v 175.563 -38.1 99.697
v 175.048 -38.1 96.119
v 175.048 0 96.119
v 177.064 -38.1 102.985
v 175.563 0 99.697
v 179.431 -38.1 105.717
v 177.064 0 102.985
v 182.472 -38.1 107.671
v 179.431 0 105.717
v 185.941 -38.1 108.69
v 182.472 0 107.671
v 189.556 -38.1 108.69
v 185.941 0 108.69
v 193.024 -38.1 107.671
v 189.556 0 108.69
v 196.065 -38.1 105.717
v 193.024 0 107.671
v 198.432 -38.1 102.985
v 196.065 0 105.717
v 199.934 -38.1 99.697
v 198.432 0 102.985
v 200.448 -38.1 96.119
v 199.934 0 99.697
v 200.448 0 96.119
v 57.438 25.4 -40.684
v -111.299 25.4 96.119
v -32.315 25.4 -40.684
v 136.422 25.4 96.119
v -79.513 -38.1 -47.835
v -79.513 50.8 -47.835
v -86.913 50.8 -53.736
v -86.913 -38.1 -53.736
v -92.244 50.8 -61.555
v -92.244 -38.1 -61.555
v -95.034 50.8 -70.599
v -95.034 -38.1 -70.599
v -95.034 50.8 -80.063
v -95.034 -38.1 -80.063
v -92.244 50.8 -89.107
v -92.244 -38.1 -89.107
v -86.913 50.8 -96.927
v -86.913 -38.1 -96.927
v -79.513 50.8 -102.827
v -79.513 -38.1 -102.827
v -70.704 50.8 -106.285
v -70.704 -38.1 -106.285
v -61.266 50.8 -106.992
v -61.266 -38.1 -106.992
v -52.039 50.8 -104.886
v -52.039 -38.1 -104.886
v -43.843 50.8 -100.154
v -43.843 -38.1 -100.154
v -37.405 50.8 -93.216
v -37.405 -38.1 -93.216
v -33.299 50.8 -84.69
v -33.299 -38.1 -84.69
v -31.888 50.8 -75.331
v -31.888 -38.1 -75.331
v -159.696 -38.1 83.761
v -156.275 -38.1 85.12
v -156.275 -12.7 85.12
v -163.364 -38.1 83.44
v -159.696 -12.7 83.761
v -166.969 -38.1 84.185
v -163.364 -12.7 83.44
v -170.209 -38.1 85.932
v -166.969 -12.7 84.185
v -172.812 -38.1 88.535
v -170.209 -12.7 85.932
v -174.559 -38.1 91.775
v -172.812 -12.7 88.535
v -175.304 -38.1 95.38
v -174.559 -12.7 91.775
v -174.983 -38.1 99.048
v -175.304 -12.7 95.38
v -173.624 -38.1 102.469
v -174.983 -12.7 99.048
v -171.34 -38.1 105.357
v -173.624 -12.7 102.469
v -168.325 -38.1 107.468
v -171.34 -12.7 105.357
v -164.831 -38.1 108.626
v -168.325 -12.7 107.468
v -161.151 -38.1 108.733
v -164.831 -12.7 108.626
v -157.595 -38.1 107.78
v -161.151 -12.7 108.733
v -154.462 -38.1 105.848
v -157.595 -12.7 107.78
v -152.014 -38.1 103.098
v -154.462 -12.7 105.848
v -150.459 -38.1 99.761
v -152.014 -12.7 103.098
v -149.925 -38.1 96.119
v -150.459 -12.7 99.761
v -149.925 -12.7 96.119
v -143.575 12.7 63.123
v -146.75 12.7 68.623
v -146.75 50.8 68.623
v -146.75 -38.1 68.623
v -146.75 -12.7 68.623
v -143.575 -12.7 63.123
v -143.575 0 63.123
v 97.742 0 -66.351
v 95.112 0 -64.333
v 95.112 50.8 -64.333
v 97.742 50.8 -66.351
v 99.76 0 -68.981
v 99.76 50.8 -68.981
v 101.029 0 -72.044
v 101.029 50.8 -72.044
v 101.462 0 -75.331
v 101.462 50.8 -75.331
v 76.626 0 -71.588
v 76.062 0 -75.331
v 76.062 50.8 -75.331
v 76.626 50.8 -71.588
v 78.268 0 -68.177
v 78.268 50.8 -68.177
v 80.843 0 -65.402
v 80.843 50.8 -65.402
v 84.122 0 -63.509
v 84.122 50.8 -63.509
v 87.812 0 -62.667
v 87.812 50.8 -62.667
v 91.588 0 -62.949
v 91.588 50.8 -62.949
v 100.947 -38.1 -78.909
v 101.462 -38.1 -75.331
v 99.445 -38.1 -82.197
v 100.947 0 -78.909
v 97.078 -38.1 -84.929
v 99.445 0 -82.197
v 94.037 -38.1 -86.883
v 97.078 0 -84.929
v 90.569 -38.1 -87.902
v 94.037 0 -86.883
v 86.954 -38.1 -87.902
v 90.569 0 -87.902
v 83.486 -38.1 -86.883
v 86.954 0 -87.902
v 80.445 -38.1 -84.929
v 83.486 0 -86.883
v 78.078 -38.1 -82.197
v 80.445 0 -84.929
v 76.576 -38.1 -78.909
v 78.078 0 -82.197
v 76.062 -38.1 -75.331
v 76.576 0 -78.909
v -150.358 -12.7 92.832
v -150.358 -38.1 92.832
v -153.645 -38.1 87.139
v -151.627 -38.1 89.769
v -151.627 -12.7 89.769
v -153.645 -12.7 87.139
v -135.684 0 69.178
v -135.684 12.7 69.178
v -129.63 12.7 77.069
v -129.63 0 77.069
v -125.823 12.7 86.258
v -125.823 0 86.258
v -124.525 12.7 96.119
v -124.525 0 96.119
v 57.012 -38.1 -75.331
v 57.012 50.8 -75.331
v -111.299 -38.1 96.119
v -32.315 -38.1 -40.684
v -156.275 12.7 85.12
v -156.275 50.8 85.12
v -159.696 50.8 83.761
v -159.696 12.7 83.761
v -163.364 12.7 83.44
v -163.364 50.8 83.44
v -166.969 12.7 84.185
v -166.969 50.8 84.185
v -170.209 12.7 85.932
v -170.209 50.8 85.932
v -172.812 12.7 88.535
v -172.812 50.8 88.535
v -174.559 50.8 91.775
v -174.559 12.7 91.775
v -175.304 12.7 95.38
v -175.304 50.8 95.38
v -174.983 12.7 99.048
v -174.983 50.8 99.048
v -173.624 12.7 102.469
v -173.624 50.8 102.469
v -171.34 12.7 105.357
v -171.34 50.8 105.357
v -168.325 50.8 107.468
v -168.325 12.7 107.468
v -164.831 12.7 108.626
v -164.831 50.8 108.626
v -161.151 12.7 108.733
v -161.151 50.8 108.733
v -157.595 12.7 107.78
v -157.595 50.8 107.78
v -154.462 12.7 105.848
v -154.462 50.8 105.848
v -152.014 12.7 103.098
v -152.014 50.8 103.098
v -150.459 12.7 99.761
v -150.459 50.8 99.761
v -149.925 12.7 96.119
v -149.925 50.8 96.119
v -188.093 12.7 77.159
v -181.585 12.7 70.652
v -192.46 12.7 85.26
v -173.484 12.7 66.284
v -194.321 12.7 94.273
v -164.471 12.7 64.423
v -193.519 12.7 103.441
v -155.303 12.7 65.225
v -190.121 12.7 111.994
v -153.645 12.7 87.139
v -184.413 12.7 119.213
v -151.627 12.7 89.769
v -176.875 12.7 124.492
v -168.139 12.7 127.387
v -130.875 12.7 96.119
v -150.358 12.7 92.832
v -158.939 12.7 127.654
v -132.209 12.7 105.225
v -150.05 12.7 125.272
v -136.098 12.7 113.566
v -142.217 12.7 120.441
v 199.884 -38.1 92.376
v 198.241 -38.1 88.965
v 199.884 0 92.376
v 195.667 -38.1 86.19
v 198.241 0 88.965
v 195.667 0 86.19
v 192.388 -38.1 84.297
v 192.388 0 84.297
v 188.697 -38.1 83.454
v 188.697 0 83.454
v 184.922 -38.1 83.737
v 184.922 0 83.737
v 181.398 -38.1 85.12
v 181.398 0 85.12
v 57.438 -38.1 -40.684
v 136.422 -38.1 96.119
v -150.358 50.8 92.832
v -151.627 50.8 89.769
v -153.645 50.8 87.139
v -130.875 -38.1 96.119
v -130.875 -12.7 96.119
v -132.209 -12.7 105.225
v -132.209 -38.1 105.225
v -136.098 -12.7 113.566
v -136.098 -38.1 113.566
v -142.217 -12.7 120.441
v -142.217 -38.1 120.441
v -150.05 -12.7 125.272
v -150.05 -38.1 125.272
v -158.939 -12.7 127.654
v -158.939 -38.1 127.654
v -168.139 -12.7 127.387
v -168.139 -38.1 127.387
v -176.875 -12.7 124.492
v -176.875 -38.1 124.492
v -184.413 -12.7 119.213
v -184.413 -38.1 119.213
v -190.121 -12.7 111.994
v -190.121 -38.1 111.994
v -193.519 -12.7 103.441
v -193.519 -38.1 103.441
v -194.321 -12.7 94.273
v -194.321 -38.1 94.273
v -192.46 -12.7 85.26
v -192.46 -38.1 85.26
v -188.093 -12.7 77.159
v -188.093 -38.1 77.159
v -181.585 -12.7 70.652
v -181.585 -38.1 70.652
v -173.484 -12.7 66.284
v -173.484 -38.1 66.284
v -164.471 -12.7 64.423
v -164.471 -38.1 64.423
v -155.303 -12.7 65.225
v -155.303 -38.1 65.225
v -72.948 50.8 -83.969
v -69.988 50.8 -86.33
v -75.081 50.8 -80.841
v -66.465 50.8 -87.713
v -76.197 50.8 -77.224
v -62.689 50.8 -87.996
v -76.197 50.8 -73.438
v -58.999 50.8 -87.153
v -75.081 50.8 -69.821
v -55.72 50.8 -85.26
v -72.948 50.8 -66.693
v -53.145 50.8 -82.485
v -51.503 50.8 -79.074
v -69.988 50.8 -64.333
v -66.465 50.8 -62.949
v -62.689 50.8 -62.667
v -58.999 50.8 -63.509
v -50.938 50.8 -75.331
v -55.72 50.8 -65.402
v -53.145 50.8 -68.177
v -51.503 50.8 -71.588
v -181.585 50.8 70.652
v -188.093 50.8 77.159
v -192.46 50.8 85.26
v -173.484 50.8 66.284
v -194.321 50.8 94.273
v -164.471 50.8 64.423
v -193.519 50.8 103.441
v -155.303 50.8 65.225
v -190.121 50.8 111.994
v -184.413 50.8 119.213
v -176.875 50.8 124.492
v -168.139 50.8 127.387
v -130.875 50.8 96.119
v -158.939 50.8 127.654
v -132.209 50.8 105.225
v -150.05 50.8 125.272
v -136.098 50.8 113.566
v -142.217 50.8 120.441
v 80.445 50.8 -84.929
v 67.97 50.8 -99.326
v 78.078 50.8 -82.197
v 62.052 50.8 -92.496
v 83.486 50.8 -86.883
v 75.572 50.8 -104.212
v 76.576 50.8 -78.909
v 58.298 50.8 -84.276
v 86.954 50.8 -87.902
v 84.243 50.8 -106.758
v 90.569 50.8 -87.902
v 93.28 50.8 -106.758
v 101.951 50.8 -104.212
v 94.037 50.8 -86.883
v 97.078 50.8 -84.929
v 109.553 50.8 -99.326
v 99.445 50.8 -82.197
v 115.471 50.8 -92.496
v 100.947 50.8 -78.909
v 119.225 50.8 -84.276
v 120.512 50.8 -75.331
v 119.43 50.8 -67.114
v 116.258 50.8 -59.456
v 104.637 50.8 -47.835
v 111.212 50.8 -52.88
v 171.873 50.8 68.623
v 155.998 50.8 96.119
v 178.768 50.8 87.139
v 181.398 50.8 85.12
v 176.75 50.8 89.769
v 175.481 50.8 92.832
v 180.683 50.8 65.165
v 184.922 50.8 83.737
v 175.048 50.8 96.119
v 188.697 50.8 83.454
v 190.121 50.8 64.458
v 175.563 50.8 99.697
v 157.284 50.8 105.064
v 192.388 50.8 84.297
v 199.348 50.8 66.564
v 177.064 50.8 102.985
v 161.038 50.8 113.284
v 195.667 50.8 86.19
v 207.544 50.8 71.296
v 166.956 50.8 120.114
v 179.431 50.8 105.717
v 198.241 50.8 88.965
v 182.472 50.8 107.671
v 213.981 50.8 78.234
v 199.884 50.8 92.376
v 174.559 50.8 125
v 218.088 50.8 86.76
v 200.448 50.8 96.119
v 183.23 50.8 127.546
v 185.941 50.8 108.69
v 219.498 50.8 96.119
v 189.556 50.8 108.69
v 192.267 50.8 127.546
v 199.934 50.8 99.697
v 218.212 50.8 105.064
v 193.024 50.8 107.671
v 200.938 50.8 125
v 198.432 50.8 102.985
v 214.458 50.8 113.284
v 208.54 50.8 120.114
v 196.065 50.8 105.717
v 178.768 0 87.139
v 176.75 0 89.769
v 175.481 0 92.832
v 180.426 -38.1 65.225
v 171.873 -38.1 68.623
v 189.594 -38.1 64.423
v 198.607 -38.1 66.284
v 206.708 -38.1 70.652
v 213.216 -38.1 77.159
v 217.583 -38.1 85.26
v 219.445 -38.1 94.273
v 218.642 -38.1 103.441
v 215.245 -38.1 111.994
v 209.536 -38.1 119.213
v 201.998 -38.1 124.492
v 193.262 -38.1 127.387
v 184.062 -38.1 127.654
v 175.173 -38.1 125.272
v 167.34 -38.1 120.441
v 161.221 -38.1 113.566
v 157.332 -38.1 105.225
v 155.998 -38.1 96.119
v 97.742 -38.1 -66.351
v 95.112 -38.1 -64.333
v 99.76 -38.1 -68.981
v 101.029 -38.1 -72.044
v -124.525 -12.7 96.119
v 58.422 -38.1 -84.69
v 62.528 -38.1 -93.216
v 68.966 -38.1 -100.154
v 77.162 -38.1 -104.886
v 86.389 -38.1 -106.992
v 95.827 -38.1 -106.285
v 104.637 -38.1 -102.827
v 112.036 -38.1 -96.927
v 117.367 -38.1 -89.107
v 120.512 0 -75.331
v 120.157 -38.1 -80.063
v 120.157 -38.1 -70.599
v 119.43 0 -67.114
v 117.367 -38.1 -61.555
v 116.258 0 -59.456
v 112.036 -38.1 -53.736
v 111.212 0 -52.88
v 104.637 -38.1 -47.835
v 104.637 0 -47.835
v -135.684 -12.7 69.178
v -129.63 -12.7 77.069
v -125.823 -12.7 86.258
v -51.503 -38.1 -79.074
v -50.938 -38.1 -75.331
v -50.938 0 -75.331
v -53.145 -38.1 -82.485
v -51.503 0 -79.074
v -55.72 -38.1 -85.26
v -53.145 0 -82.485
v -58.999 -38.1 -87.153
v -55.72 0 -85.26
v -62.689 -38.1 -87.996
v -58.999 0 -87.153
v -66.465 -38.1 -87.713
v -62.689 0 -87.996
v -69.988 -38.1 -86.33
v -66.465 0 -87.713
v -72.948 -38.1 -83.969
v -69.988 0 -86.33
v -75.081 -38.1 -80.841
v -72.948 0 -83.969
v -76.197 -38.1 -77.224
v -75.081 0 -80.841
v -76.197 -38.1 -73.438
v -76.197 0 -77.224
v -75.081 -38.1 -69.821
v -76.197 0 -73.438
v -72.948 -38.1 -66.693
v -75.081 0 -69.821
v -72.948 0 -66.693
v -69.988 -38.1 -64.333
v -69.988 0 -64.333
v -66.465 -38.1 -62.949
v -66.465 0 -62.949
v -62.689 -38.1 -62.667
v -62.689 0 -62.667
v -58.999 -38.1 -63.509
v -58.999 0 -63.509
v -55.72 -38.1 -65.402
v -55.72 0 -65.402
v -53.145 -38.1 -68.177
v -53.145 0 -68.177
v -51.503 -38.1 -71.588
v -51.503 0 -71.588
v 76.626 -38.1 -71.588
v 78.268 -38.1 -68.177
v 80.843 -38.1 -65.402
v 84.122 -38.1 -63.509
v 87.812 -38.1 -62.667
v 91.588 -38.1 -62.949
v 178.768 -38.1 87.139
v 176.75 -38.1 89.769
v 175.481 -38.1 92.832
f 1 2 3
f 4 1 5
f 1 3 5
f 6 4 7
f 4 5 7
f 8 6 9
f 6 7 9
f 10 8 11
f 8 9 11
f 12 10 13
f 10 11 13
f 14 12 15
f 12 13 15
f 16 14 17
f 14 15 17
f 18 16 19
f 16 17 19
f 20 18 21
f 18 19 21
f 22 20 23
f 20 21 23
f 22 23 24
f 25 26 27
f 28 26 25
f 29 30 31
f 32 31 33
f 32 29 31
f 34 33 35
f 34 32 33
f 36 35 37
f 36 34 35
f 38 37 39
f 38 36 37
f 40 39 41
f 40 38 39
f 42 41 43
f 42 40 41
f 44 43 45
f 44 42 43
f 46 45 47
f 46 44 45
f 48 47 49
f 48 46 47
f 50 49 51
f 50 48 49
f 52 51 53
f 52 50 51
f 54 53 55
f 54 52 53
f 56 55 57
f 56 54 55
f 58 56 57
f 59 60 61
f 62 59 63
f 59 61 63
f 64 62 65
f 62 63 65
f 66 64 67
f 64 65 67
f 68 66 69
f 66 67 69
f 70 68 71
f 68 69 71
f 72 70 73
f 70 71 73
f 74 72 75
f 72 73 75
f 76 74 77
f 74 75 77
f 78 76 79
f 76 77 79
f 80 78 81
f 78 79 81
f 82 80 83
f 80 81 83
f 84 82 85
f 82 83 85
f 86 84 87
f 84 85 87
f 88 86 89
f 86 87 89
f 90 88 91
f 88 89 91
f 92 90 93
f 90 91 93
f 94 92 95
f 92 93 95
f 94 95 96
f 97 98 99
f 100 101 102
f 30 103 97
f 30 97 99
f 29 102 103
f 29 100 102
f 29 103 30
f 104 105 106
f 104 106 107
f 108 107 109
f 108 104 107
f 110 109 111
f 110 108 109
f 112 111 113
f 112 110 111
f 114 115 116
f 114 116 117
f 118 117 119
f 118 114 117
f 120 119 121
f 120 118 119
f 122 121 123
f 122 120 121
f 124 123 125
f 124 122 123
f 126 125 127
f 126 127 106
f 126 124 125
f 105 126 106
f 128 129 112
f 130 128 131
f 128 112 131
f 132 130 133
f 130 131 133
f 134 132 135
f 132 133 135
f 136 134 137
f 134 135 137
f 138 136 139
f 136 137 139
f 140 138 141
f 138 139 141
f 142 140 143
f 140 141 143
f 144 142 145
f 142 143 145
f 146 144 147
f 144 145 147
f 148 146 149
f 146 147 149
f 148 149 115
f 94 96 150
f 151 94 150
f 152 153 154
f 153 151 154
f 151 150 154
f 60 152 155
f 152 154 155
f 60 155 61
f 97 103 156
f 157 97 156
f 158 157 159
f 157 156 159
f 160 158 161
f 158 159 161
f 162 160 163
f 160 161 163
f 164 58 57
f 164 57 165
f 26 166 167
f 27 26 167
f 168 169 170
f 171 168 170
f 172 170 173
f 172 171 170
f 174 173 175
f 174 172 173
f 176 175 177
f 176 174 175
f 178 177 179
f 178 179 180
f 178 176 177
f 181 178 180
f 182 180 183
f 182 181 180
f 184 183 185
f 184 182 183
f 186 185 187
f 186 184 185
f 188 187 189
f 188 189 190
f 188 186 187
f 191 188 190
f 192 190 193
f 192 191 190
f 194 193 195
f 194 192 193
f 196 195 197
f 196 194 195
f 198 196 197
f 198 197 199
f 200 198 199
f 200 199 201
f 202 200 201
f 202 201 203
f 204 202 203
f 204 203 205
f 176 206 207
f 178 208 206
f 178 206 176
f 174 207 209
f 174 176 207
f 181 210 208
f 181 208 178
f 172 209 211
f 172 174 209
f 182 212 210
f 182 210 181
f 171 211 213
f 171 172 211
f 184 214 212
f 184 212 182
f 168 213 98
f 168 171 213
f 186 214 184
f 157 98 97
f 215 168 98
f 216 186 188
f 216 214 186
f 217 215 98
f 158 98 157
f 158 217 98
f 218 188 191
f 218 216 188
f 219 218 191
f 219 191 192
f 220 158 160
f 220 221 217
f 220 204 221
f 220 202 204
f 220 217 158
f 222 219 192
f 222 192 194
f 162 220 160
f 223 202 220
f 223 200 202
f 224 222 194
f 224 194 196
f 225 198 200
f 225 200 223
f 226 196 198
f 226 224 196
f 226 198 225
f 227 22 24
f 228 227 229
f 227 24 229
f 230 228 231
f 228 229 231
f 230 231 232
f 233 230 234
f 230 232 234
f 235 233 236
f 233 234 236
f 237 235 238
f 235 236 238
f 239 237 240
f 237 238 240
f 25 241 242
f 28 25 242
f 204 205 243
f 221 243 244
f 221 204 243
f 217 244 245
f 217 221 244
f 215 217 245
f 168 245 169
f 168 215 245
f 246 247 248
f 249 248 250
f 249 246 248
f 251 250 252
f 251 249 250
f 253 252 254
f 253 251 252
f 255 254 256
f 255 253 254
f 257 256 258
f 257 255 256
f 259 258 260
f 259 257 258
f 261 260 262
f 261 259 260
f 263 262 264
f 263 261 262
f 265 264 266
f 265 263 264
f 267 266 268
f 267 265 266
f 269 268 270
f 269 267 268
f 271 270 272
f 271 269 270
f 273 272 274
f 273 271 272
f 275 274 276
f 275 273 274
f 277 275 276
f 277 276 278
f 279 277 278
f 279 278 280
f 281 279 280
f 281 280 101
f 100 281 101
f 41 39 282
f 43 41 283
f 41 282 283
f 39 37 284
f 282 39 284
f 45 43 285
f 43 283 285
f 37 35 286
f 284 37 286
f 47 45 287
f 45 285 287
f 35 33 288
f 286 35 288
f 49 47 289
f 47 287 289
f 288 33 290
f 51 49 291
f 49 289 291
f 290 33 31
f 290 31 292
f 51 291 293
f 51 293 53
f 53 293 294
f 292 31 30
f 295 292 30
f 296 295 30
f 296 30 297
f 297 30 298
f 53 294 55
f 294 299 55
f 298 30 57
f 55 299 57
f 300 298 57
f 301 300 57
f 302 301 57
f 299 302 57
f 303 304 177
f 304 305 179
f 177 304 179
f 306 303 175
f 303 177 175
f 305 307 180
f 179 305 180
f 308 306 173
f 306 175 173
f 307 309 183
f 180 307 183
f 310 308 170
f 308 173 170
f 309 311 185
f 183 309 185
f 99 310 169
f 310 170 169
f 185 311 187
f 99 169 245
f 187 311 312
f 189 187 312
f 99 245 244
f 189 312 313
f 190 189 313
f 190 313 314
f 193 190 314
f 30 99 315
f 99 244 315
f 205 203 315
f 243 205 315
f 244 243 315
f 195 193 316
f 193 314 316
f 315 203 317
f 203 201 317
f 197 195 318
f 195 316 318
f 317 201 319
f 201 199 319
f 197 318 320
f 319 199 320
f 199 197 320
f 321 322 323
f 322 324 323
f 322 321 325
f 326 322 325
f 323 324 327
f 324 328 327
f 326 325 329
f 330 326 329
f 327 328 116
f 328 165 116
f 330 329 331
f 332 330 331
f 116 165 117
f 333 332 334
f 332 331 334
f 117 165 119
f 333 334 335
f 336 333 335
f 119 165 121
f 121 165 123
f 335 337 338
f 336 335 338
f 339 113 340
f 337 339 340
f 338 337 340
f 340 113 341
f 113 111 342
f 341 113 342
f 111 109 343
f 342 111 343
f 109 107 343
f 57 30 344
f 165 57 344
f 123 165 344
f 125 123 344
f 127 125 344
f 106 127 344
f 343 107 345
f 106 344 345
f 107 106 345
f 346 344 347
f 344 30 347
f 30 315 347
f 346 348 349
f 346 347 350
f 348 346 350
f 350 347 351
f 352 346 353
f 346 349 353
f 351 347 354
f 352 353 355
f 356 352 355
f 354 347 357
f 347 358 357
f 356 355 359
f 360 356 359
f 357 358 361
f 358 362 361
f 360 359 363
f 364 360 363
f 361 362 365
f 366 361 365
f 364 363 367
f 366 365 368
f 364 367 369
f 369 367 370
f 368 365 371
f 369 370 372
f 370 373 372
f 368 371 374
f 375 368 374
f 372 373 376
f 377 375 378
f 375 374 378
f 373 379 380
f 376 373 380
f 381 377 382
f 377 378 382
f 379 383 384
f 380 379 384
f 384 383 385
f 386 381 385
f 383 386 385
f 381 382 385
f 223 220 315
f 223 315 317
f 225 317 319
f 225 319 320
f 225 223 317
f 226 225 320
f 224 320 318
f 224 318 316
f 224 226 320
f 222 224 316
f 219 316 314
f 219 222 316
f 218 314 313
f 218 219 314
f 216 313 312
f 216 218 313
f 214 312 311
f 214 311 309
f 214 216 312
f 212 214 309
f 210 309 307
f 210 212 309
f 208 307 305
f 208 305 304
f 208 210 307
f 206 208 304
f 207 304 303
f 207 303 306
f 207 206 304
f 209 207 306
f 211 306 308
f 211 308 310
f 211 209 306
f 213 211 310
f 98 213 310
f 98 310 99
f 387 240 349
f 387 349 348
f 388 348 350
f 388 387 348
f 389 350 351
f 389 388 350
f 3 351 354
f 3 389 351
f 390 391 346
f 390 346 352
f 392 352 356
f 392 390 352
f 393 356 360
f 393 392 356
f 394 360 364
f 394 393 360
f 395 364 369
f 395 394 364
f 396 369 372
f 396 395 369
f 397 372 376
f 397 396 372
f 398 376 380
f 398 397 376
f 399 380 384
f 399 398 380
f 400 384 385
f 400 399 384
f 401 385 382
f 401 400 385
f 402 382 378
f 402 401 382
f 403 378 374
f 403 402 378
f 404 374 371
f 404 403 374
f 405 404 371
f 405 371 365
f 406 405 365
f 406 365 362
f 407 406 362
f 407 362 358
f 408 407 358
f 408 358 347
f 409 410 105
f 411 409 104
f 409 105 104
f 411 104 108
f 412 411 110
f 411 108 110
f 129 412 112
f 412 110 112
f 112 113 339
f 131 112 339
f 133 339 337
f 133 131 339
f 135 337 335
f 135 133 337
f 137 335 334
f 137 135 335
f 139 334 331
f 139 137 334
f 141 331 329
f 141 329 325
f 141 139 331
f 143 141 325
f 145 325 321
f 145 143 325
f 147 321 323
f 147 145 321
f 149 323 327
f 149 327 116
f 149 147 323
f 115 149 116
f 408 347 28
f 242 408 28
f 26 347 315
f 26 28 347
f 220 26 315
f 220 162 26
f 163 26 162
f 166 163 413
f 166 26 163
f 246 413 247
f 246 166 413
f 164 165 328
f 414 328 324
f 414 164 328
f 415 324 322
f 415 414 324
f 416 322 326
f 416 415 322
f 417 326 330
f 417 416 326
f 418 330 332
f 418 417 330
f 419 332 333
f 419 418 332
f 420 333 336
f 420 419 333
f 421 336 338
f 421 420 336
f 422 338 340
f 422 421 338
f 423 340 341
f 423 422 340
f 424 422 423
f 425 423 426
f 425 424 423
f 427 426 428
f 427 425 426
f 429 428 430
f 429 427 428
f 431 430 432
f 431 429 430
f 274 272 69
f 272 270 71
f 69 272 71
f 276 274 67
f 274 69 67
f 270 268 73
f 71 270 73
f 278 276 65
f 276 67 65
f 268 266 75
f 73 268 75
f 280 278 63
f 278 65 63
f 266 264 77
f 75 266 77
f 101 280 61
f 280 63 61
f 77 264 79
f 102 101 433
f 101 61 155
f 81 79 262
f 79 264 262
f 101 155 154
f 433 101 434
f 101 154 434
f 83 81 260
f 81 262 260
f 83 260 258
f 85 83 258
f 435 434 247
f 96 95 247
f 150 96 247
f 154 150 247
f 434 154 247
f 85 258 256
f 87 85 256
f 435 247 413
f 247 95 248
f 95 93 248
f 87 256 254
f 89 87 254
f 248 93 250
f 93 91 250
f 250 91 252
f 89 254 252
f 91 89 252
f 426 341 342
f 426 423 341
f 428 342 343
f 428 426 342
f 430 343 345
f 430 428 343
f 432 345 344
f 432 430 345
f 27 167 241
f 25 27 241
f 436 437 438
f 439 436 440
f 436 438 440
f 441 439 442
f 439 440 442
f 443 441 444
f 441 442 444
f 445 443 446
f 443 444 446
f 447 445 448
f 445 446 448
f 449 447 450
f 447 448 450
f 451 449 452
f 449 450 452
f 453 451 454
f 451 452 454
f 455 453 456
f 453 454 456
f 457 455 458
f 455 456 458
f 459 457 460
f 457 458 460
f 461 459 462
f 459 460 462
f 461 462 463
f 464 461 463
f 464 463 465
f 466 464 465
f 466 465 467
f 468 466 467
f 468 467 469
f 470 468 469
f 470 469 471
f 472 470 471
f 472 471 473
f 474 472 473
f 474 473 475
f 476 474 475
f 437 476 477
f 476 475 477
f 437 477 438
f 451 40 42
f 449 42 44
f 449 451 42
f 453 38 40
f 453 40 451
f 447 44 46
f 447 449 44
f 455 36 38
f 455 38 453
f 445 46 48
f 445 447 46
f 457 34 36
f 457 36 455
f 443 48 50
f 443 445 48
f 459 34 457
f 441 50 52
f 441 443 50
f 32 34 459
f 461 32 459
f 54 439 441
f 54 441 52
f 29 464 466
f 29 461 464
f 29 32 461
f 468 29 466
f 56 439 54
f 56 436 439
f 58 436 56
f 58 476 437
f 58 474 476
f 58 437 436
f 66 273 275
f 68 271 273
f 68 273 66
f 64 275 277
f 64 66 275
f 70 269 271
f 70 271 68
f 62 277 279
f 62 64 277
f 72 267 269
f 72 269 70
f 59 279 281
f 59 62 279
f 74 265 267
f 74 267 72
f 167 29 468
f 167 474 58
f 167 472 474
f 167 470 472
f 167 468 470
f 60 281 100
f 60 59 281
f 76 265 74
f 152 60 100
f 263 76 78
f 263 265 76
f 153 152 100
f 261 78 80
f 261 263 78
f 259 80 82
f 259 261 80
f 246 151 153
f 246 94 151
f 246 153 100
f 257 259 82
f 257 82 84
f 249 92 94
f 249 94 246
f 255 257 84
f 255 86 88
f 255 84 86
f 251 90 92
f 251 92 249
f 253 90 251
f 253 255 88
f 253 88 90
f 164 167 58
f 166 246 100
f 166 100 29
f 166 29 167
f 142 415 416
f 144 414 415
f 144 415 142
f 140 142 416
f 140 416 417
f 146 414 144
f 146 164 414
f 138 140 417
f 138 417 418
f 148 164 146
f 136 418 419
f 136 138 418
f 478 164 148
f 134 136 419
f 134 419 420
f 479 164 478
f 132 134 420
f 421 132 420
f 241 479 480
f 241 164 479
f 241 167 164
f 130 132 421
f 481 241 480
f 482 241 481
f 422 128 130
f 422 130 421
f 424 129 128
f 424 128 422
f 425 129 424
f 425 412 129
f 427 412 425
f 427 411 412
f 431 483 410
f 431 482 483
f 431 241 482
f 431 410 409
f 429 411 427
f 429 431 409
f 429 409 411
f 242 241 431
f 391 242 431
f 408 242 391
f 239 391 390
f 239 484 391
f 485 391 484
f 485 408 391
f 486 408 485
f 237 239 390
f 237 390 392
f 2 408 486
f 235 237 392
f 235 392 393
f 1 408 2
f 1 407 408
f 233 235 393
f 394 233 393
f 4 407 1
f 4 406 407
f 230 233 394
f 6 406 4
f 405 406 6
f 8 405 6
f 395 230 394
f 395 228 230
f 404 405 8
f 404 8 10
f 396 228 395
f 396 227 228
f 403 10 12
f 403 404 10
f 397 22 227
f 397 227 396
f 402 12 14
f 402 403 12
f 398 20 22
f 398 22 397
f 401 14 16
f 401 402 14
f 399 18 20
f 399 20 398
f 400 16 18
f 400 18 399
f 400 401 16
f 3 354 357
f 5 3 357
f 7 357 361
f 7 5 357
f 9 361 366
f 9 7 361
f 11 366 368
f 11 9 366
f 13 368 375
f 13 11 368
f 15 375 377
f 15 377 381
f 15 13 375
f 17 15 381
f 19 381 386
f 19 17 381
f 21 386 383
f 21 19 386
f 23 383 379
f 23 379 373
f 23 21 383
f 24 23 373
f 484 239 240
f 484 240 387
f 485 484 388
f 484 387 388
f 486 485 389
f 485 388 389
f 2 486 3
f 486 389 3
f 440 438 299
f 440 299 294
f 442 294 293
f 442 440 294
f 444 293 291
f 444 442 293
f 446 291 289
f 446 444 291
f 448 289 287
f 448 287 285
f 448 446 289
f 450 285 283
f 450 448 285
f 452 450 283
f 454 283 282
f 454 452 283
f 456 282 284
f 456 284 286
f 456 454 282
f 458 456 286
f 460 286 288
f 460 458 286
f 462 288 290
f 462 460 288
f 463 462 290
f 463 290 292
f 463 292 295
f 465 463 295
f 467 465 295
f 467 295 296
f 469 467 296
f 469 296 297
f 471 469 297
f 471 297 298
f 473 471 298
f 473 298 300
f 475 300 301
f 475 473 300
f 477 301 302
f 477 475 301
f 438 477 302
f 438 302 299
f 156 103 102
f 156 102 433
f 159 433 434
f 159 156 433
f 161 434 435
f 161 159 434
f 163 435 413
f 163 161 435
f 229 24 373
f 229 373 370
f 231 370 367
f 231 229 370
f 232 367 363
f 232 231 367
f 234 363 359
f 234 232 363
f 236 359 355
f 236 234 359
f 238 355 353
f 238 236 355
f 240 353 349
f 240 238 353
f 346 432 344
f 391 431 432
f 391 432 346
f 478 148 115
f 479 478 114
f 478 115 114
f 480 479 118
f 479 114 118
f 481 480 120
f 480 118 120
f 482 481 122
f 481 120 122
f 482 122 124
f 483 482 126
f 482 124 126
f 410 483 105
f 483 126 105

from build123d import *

# Parameters (mm, degrees)
F1_DEPTH  = 50.8
F3_DEPTH  = 76.2
F4_R      = 38.1
F1_FACE_R = 12.7
F5_DEPTH  = 12.7


with BuildPart() as f1:
    # F0 (on Front) → F1 (new body, symmetric)
    with BuildSketch(Plane.XZ):
        with BuildLine():
            ThreePointArc((-130.8751894546, 96.1189323328), (-190.1214960247, 111.9939323328), (-146.7501894546, 68.6226257627))
            Line((-146.7501894546, 68.6226257627), (-156.2751894546, 85.1204097048))
            ThreePointArc((-156.2751894546, 85.1204097048), (-173.6237120826, 102.4689323328), (-149.9251894546, 96.1189323328))
            Line((-149.9251894546, 96.1189323328), (-130.8751894546, 96.1189323328))
        make_face()
        with BuildLine():
            Line((-156.2751894546, 85.1204097048), (-146.7501894546, 68.6226257627))
            ThreePointArc((-146.7501894546, 68.6226257627), (-135.1288828844, 80.2439323328), (-130.8751894546, 96.1189323328))
            Line((-130.8751894546, 96.1189323328), (-149.9251894546, 96.1189323328))
            ThreePointArc((-149.9251894546, 96.1189323328), (-151.6266668265, 89.7689323328), (-156.2751894546, 85.1204097048))
        make_face()
        with BuildLine():
            Line((181.3982178505, 85.1204097048), (171.8732178505, 68.6226257627))
            ThreePointArc((171.8732178505, 68.6226257627), (203.6232178505, 68.6226257627), (219.4982178505, 96.1189323328))
            ThreePointArc((219.4982178505, 96.1189323328), (187.7482178505, 127.8689323328), (155.9982178505, 96.1189323328))
            Line((155.9982178505, 96.1189323328), (175.0482178505, 96.1189323328))
            ThreePointArc((175.0482178505, 96.1189323328), (187.7482178505, 108.8189323328), (200.4482178505, 96.1189323328))
            ThreePointArc((200.4482178505, 96.1189323328), (194.0982178505, 85.1204097048), (181.3982178505, 85.1204097048))
        make_face()
        with BuildLine():
            ThreePointArc((-79.513485802, -47.834761097), (-47.763485802, -47.834761097), (-31.888485802, -75.3310676672))
            Line((-31.888485802, -75.3310676672), (57.011514198, -75.3310676672))
            ThreePointArc((57.011514198, -75.3310676672), (72.886514198, -47.834761097), (104.636514198, -47.834761097))
            Line((104.636514198, -47.834761097), (171.8732178505, 68.6226257627))
            ThreePointArc((171.8732178505, 68.6226257627), (160.2519112804, 80.2439323328), (155.9982178505, 96.1189323328))
            Line((155.9982178505, 96.1189323328), (-130.8751894546, 96.1189323328))
            ThreePointArc((-130.8751894546, 96.1189323328), (-135.1288828844, 80.2439323328), (-146.7501894546, 68.6226257627))
            Line((-146.7501894546, 68.6226257627), (-79.513485802, -47.834761097))
        make_face()
        with BuildLine():
            Line((76.061514198, -75.3310676672), (57.011514198, -75.3310676672))
            ThreePointArc((57.011514198, -75.3310676672), (88.761514198, -107.0810676672), (120.511514198, -75.3310676672))
            ThreePointArc((120.511514198, -75.3310676672), (116.2578207681, -59.4560676672), (104.636514198, -47.834761097))
            Line((104.636514198, -47.834761097), (95.111514198, -64.3325450391))
            ThreePointArc((95.111514198, -64.3325450391), (99.760036826, -68.9810676672), (101.461514198, -75.3310676672))
            ThreePointArc((101.461514198, -75.3310676672), (88.761514198, -88.0310676672), (76.061514198, -75.3310676672))
        make_face()
        with BuildLine():
            ThreePointArc((104.636514198, -47.834761097), (72.886514198, -47.834761097), (57.011514198, -75.3310676672))
            Line((57.011514198, -75.3310676672), (76.061514198, -75.3310676672))
            ThreePointArc((76.061514198, -75.3310676672), (82.411514198, -64.3325450391), (95.111514198, -64.3325450391))
            Line((95.111514198, -64.3325450391), (104.636514198, -47.834761097))
        make_face()
        with BuildLine():
            Line((-31.888485802, -75.3310676672), (-50.938485802, -75.3310676672))
            ThreePointArc((-50.938485802, -75.3310676672), (-69.988485802, -86.3295902952), (-69.988485802, -64.3325450391))
            Line((-69.988485802, -64.3325450391), (-79.513485802, -47.834761097))
            ThreePointArc((-79.513485802, -47.834761097), (-79.513485802, -102.8273742373), (-31.888485802, -75.3310676672))
        make_face()
        with BuildLine():
            ThreePointArc((-69.988485802, -64.3325450391), (-57.288485802, -64.3325450391), (-50.938485802, -75.3310676672))
            Line((-50.938485802, -75.3310676672), (-31.888485802, -75.3310676672))
            ThreePointArc((-31.888485802, -75.3310676672), (-47.763485802, -47.834761097), (-79.513485802, -47.834761097))
            Line((-79.513485802, -47.834761097), (-69.988485802, -64.3325450391))
        make_face()
        with BuildLine():
            ThreePointArc((155.9982178505, 96.1189323328), (160.2519112804, 80.2439323328), (171.8732178505, 68.6226257627))
            Line((171.8732178505, 68.6226257627), (181.3982178505, 85.1204097048))
            ThreePointArc((181.3982178505, 85.1204097048), (176.7496952225, 89.7689323328), (175.0482178505, 96.1189323328))
            Line((175.0482178505, 96.1189323328), (155.9982178505, 96.1189323328))
        make_face()
    extrude(amount=F1_DEPTH, both=True)

    # F2 (on face) → F3 (cut)
    with BuildSketch(Plane.XZ.offset(50.8)):
        Polygon((136.4217789196, 96.1189323328), (-111.2987505236, 96.1189323328), (-32.3154252183, -40.6842000468), (57.4384536142, -40.6842000468), align=None)
    extrude(amount=-F3_DEPTH, mode=Mode.SUBTRACT)

    # F4 (on Front) + F1_face (on face) → F5 (cut, symmetric)
    with BuildSketch(Plane.XZ):
        with Locations((-162.6251894546, 96.1189323328)):
            Circle(F4_R)
    with BuildSketch(Plane(origin=(12.561514198, -50.8, 21.3503423812), x_dir=(1, 0, 0), z_dir=(0, -1, 0))):
        with BuildLine():
            Line((-123.8602647216, 74.7685899517), (-143.4367036526, 74.7685899517))
            ThreePointArc((-143.4367036526, 74.7685899517), (-202.6830102227, 90.6435899517), (-159.3117036526, 47.2722833815))
            Line((-159.3117036526, 47.2722833815), (-92.075, -69.1851034782))
            ThreePointArc((-92.075, -69.1851034782), (-92.075, -124.1777166185), (-44.45, -96.6814100483))
            Line((-44.45, -96.6814100483), (44.45, -96.6814100483))
            ThreePointArc((44.45, -96.6814100483), (92.075, -124.1777166185), (92.075, -69.1851034782))
            Line((92.075, -69.1851034782), (159.3117036526, 47.2722833815))
            ThreePointArc((159.3117036526, 47.2722833815), (202.6830102227, 90.6435899517), (143.4367036526, 74.7685899517))
            Line((143.4367036526, 74.7685899517), (123.8602647216, 74.7685899517))
            Line((123.8602647216, 74.7685899517), (44.8769394163, -62.0345424279))
            Line((44.8769394163, -62.0345424279), (-44.8769394163, -62.0345424279))
            Line((-44.8769394163, -62.0345424279), (-123.8602647216, 74.7685899517))
        make_face()
        with Locations((-76.2, -96.6814100483)):
            Circle(F1_FACE_R, mode=Mode.SUBTRACT)
        with Locations((76.2, -96.6814100483)):
            Circle(F1_FACE_R, mode=Mode.SUBTRACT)
        with Locations((-175.1867036526, 74.7685899517)):
            Circle(F1_FACE_R, mode=Mode.SUBTRACT)
        with Locations((175.1867036526, 74.7685899517)):
            Circle(F1_FACE_R, mode=Mode.SUBTRACT)
    extrude(amount=F5_DEPTH, both=True, mode=Mode.SUBTRACT)


solid = f1.part
